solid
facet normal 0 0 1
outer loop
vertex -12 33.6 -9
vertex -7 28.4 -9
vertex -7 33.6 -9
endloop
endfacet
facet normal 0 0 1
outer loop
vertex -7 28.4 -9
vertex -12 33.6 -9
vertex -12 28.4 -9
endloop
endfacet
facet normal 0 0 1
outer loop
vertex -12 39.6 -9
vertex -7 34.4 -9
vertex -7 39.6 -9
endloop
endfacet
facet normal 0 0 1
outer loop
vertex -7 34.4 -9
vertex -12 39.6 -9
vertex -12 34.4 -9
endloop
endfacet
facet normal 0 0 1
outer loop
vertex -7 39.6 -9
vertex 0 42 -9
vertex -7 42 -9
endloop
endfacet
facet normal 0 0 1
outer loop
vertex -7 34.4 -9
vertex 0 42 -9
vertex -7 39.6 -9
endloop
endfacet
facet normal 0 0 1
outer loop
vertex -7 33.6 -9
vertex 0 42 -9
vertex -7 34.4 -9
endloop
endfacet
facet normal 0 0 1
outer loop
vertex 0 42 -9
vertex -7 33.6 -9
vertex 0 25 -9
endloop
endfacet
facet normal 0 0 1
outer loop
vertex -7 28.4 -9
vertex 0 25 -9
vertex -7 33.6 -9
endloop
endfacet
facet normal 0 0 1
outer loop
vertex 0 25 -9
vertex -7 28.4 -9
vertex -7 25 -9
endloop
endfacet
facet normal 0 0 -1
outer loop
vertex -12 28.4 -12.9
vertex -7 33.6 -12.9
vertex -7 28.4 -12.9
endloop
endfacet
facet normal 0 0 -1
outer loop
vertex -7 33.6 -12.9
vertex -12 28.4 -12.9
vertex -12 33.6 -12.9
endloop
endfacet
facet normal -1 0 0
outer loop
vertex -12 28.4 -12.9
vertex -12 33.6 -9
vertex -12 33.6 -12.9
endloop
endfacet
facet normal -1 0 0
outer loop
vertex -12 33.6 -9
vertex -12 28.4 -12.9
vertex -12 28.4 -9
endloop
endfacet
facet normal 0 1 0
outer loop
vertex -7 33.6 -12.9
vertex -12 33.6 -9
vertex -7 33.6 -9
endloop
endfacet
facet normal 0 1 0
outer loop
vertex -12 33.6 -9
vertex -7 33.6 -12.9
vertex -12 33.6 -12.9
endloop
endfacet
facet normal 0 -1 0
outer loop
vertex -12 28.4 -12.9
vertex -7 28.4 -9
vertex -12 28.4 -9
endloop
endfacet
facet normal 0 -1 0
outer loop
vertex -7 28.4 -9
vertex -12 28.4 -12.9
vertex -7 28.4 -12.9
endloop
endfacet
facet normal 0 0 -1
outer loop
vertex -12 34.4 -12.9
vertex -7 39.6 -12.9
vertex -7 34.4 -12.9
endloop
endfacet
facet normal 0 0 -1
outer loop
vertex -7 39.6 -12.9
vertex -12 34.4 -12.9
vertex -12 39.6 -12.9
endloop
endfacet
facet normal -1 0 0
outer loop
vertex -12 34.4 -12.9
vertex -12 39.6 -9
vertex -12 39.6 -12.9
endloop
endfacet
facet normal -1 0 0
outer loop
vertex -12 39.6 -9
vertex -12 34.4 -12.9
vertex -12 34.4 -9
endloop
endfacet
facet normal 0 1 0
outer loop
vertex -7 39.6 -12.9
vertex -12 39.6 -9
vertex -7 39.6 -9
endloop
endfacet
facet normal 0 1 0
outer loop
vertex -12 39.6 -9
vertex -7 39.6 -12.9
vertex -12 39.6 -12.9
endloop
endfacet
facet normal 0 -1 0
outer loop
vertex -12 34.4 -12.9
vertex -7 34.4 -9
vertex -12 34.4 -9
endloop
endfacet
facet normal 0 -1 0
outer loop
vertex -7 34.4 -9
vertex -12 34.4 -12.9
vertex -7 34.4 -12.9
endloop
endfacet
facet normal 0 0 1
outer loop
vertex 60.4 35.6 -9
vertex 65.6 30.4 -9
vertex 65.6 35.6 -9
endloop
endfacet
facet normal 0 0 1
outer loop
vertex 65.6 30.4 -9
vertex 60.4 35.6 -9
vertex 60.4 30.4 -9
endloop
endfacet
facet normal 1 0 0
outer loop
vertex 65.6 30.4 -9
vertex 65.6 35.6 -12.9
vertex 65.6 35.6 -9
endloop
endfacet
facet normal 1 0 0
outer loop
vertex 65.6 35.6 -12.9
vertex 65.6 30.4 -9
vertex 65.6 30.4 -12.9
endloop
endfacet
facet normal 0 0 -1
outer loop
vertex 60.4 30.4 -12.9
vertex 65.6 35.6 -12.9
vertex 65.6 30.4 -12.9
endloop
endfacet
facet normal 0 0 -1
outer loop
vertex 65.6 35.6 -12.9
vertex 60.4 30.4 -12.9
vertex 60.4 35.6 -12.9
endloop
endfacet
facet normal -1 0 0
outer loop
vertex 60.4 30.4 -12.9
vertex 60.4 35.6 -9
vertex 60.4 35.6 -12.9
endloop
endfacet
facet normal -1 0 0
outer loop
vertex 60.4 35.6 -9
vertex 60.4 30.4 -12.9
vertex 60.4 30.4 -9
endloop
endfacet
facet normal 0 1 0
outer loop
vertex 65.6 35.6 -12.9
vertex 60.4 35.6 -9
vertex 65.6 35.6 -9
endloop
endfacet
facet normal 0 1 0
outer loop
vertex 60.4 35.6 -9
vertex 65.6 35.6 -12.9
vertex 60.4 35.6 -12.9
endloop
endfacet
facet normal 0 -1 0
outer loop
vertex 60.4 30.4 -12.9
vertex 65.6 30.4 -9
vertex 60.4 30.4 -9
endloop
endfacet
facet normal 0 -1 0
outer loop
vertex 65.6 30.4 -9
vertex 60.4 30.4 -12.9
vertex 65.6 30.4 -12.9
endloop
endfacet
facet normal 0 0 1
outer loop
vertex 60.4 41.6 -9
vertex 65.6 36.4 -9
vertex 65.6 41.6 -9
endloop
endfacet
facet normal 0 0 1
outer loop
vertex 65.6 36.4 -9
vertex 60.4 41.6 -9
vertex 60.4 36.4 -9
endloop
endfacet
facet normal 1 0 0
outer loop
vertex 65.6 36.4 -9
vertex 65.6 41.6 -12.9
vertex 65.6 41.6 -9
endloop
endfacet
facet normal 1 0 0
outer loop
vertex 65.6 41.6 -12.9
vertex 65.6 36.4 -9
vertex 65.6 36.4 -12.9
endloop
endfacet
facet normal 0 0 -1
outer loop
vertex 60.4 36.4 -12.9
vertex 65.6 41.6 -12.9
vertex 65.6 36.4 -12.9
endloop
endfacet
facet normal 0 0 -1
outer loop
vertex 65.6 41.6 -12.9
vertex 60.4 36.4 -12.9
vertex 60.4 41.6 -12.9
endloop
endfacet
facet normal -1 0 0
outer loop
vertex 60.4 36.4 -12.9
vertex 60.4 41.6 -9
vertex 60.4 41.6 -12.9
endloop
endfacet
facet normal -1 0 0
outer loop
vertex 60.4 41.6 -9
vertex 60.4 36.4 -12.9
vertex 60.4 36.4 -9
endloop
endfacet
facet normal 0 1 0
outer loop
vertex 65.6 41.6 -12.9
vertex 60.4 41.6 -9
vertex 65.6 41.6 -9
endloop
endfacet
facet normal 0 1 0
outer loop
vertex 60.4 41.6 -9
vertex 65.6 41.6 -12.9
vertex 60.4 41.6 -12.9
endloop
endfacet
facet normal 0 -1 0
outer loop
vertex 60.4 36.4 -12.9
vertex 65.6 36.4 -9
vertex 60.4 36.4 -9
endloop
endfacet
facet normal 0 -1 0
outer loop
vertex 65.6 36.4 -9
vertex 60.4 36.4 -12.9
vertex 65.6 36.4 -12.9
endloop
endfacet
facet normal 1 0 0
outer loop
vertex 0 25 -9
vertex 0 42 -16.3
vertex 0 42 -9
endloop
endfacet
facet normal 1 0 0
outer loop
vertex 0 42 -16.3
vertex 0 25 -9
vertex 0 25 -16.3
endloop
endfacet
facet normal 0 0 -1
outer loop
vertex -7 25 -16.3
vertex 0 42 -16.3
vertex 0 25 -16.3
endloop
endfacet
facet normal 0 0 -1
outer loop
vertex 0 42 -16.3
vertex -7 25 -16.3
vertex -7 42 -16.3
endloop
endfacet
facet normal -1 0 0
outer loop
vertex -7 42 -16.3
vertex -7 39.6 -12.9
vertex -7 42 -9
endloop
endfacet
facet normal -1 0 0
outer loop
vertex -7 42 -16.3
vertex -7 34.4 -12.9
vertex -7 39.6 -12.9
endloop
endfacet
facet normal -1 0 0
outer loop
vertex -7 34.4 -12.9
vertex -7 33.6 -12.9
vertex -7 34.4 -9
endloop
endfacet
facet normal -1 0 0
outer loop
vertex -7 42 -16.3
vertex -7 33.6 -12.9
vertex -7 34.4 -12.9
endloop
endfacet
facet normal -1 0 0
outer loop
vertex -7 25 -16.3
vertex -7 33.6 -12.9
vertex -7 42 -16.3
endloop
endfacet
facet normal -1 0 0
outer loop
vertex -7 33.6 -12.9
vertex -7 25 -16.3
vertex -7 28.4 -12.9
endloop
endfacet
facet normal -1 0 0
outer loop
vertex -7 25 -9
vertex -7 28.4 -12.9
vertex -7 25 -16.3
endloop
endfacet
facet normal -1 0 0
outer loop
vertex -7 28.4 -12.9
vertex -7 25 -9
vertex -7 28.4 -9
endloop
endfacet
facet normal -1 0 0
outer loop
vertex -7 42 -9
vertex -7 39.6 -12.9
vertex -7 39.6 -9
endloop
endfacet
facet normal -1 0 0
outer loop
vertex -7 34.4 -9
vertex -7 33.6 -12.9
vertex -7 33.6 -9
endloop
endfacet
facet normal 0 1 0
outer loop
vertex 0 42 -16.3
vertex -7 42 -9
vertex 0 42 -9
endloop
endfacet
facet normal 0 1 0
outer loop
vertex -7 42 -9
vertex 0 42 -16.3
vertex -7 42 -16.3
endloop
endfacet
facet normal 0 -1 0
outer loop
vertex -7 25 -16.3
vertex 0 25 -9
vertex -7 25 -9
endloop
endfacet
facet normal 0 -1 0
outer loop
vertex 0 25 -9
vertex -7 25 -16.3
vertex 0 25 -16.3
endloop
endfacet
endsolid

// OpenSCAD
// Service and installed harness envelopes only; translucent volumes are not fabricated parts.
// Primary left: preserve twist, maximum6mm round bundle,≤1.3mmstrap; maxstack7.3mm.
color([0,0.4,1,.2])translate([-7,25,-16.3])cube([7,17,7.3]);
// Side parked T18R head volumes; do not put3.7mmheads beneath6mmbundle.
for(y=[31,37])color([0,0.8,1,.3])translate([-12,y-2.6,-12.9])cube([5.2,5.2,3.9]);
// Right coax service loop only; SMA bulkhead carries external coax pull.
for(y=[33,39]){
 color([0,.4,1,.2])translate([61.5,y-.75,-11.8])cube([3,1.5,2.8]);
 color([0,.8,1,.3])translate([60.4,y-2.6,-12.9])cube([5.2,5.2,3.9]);
}
